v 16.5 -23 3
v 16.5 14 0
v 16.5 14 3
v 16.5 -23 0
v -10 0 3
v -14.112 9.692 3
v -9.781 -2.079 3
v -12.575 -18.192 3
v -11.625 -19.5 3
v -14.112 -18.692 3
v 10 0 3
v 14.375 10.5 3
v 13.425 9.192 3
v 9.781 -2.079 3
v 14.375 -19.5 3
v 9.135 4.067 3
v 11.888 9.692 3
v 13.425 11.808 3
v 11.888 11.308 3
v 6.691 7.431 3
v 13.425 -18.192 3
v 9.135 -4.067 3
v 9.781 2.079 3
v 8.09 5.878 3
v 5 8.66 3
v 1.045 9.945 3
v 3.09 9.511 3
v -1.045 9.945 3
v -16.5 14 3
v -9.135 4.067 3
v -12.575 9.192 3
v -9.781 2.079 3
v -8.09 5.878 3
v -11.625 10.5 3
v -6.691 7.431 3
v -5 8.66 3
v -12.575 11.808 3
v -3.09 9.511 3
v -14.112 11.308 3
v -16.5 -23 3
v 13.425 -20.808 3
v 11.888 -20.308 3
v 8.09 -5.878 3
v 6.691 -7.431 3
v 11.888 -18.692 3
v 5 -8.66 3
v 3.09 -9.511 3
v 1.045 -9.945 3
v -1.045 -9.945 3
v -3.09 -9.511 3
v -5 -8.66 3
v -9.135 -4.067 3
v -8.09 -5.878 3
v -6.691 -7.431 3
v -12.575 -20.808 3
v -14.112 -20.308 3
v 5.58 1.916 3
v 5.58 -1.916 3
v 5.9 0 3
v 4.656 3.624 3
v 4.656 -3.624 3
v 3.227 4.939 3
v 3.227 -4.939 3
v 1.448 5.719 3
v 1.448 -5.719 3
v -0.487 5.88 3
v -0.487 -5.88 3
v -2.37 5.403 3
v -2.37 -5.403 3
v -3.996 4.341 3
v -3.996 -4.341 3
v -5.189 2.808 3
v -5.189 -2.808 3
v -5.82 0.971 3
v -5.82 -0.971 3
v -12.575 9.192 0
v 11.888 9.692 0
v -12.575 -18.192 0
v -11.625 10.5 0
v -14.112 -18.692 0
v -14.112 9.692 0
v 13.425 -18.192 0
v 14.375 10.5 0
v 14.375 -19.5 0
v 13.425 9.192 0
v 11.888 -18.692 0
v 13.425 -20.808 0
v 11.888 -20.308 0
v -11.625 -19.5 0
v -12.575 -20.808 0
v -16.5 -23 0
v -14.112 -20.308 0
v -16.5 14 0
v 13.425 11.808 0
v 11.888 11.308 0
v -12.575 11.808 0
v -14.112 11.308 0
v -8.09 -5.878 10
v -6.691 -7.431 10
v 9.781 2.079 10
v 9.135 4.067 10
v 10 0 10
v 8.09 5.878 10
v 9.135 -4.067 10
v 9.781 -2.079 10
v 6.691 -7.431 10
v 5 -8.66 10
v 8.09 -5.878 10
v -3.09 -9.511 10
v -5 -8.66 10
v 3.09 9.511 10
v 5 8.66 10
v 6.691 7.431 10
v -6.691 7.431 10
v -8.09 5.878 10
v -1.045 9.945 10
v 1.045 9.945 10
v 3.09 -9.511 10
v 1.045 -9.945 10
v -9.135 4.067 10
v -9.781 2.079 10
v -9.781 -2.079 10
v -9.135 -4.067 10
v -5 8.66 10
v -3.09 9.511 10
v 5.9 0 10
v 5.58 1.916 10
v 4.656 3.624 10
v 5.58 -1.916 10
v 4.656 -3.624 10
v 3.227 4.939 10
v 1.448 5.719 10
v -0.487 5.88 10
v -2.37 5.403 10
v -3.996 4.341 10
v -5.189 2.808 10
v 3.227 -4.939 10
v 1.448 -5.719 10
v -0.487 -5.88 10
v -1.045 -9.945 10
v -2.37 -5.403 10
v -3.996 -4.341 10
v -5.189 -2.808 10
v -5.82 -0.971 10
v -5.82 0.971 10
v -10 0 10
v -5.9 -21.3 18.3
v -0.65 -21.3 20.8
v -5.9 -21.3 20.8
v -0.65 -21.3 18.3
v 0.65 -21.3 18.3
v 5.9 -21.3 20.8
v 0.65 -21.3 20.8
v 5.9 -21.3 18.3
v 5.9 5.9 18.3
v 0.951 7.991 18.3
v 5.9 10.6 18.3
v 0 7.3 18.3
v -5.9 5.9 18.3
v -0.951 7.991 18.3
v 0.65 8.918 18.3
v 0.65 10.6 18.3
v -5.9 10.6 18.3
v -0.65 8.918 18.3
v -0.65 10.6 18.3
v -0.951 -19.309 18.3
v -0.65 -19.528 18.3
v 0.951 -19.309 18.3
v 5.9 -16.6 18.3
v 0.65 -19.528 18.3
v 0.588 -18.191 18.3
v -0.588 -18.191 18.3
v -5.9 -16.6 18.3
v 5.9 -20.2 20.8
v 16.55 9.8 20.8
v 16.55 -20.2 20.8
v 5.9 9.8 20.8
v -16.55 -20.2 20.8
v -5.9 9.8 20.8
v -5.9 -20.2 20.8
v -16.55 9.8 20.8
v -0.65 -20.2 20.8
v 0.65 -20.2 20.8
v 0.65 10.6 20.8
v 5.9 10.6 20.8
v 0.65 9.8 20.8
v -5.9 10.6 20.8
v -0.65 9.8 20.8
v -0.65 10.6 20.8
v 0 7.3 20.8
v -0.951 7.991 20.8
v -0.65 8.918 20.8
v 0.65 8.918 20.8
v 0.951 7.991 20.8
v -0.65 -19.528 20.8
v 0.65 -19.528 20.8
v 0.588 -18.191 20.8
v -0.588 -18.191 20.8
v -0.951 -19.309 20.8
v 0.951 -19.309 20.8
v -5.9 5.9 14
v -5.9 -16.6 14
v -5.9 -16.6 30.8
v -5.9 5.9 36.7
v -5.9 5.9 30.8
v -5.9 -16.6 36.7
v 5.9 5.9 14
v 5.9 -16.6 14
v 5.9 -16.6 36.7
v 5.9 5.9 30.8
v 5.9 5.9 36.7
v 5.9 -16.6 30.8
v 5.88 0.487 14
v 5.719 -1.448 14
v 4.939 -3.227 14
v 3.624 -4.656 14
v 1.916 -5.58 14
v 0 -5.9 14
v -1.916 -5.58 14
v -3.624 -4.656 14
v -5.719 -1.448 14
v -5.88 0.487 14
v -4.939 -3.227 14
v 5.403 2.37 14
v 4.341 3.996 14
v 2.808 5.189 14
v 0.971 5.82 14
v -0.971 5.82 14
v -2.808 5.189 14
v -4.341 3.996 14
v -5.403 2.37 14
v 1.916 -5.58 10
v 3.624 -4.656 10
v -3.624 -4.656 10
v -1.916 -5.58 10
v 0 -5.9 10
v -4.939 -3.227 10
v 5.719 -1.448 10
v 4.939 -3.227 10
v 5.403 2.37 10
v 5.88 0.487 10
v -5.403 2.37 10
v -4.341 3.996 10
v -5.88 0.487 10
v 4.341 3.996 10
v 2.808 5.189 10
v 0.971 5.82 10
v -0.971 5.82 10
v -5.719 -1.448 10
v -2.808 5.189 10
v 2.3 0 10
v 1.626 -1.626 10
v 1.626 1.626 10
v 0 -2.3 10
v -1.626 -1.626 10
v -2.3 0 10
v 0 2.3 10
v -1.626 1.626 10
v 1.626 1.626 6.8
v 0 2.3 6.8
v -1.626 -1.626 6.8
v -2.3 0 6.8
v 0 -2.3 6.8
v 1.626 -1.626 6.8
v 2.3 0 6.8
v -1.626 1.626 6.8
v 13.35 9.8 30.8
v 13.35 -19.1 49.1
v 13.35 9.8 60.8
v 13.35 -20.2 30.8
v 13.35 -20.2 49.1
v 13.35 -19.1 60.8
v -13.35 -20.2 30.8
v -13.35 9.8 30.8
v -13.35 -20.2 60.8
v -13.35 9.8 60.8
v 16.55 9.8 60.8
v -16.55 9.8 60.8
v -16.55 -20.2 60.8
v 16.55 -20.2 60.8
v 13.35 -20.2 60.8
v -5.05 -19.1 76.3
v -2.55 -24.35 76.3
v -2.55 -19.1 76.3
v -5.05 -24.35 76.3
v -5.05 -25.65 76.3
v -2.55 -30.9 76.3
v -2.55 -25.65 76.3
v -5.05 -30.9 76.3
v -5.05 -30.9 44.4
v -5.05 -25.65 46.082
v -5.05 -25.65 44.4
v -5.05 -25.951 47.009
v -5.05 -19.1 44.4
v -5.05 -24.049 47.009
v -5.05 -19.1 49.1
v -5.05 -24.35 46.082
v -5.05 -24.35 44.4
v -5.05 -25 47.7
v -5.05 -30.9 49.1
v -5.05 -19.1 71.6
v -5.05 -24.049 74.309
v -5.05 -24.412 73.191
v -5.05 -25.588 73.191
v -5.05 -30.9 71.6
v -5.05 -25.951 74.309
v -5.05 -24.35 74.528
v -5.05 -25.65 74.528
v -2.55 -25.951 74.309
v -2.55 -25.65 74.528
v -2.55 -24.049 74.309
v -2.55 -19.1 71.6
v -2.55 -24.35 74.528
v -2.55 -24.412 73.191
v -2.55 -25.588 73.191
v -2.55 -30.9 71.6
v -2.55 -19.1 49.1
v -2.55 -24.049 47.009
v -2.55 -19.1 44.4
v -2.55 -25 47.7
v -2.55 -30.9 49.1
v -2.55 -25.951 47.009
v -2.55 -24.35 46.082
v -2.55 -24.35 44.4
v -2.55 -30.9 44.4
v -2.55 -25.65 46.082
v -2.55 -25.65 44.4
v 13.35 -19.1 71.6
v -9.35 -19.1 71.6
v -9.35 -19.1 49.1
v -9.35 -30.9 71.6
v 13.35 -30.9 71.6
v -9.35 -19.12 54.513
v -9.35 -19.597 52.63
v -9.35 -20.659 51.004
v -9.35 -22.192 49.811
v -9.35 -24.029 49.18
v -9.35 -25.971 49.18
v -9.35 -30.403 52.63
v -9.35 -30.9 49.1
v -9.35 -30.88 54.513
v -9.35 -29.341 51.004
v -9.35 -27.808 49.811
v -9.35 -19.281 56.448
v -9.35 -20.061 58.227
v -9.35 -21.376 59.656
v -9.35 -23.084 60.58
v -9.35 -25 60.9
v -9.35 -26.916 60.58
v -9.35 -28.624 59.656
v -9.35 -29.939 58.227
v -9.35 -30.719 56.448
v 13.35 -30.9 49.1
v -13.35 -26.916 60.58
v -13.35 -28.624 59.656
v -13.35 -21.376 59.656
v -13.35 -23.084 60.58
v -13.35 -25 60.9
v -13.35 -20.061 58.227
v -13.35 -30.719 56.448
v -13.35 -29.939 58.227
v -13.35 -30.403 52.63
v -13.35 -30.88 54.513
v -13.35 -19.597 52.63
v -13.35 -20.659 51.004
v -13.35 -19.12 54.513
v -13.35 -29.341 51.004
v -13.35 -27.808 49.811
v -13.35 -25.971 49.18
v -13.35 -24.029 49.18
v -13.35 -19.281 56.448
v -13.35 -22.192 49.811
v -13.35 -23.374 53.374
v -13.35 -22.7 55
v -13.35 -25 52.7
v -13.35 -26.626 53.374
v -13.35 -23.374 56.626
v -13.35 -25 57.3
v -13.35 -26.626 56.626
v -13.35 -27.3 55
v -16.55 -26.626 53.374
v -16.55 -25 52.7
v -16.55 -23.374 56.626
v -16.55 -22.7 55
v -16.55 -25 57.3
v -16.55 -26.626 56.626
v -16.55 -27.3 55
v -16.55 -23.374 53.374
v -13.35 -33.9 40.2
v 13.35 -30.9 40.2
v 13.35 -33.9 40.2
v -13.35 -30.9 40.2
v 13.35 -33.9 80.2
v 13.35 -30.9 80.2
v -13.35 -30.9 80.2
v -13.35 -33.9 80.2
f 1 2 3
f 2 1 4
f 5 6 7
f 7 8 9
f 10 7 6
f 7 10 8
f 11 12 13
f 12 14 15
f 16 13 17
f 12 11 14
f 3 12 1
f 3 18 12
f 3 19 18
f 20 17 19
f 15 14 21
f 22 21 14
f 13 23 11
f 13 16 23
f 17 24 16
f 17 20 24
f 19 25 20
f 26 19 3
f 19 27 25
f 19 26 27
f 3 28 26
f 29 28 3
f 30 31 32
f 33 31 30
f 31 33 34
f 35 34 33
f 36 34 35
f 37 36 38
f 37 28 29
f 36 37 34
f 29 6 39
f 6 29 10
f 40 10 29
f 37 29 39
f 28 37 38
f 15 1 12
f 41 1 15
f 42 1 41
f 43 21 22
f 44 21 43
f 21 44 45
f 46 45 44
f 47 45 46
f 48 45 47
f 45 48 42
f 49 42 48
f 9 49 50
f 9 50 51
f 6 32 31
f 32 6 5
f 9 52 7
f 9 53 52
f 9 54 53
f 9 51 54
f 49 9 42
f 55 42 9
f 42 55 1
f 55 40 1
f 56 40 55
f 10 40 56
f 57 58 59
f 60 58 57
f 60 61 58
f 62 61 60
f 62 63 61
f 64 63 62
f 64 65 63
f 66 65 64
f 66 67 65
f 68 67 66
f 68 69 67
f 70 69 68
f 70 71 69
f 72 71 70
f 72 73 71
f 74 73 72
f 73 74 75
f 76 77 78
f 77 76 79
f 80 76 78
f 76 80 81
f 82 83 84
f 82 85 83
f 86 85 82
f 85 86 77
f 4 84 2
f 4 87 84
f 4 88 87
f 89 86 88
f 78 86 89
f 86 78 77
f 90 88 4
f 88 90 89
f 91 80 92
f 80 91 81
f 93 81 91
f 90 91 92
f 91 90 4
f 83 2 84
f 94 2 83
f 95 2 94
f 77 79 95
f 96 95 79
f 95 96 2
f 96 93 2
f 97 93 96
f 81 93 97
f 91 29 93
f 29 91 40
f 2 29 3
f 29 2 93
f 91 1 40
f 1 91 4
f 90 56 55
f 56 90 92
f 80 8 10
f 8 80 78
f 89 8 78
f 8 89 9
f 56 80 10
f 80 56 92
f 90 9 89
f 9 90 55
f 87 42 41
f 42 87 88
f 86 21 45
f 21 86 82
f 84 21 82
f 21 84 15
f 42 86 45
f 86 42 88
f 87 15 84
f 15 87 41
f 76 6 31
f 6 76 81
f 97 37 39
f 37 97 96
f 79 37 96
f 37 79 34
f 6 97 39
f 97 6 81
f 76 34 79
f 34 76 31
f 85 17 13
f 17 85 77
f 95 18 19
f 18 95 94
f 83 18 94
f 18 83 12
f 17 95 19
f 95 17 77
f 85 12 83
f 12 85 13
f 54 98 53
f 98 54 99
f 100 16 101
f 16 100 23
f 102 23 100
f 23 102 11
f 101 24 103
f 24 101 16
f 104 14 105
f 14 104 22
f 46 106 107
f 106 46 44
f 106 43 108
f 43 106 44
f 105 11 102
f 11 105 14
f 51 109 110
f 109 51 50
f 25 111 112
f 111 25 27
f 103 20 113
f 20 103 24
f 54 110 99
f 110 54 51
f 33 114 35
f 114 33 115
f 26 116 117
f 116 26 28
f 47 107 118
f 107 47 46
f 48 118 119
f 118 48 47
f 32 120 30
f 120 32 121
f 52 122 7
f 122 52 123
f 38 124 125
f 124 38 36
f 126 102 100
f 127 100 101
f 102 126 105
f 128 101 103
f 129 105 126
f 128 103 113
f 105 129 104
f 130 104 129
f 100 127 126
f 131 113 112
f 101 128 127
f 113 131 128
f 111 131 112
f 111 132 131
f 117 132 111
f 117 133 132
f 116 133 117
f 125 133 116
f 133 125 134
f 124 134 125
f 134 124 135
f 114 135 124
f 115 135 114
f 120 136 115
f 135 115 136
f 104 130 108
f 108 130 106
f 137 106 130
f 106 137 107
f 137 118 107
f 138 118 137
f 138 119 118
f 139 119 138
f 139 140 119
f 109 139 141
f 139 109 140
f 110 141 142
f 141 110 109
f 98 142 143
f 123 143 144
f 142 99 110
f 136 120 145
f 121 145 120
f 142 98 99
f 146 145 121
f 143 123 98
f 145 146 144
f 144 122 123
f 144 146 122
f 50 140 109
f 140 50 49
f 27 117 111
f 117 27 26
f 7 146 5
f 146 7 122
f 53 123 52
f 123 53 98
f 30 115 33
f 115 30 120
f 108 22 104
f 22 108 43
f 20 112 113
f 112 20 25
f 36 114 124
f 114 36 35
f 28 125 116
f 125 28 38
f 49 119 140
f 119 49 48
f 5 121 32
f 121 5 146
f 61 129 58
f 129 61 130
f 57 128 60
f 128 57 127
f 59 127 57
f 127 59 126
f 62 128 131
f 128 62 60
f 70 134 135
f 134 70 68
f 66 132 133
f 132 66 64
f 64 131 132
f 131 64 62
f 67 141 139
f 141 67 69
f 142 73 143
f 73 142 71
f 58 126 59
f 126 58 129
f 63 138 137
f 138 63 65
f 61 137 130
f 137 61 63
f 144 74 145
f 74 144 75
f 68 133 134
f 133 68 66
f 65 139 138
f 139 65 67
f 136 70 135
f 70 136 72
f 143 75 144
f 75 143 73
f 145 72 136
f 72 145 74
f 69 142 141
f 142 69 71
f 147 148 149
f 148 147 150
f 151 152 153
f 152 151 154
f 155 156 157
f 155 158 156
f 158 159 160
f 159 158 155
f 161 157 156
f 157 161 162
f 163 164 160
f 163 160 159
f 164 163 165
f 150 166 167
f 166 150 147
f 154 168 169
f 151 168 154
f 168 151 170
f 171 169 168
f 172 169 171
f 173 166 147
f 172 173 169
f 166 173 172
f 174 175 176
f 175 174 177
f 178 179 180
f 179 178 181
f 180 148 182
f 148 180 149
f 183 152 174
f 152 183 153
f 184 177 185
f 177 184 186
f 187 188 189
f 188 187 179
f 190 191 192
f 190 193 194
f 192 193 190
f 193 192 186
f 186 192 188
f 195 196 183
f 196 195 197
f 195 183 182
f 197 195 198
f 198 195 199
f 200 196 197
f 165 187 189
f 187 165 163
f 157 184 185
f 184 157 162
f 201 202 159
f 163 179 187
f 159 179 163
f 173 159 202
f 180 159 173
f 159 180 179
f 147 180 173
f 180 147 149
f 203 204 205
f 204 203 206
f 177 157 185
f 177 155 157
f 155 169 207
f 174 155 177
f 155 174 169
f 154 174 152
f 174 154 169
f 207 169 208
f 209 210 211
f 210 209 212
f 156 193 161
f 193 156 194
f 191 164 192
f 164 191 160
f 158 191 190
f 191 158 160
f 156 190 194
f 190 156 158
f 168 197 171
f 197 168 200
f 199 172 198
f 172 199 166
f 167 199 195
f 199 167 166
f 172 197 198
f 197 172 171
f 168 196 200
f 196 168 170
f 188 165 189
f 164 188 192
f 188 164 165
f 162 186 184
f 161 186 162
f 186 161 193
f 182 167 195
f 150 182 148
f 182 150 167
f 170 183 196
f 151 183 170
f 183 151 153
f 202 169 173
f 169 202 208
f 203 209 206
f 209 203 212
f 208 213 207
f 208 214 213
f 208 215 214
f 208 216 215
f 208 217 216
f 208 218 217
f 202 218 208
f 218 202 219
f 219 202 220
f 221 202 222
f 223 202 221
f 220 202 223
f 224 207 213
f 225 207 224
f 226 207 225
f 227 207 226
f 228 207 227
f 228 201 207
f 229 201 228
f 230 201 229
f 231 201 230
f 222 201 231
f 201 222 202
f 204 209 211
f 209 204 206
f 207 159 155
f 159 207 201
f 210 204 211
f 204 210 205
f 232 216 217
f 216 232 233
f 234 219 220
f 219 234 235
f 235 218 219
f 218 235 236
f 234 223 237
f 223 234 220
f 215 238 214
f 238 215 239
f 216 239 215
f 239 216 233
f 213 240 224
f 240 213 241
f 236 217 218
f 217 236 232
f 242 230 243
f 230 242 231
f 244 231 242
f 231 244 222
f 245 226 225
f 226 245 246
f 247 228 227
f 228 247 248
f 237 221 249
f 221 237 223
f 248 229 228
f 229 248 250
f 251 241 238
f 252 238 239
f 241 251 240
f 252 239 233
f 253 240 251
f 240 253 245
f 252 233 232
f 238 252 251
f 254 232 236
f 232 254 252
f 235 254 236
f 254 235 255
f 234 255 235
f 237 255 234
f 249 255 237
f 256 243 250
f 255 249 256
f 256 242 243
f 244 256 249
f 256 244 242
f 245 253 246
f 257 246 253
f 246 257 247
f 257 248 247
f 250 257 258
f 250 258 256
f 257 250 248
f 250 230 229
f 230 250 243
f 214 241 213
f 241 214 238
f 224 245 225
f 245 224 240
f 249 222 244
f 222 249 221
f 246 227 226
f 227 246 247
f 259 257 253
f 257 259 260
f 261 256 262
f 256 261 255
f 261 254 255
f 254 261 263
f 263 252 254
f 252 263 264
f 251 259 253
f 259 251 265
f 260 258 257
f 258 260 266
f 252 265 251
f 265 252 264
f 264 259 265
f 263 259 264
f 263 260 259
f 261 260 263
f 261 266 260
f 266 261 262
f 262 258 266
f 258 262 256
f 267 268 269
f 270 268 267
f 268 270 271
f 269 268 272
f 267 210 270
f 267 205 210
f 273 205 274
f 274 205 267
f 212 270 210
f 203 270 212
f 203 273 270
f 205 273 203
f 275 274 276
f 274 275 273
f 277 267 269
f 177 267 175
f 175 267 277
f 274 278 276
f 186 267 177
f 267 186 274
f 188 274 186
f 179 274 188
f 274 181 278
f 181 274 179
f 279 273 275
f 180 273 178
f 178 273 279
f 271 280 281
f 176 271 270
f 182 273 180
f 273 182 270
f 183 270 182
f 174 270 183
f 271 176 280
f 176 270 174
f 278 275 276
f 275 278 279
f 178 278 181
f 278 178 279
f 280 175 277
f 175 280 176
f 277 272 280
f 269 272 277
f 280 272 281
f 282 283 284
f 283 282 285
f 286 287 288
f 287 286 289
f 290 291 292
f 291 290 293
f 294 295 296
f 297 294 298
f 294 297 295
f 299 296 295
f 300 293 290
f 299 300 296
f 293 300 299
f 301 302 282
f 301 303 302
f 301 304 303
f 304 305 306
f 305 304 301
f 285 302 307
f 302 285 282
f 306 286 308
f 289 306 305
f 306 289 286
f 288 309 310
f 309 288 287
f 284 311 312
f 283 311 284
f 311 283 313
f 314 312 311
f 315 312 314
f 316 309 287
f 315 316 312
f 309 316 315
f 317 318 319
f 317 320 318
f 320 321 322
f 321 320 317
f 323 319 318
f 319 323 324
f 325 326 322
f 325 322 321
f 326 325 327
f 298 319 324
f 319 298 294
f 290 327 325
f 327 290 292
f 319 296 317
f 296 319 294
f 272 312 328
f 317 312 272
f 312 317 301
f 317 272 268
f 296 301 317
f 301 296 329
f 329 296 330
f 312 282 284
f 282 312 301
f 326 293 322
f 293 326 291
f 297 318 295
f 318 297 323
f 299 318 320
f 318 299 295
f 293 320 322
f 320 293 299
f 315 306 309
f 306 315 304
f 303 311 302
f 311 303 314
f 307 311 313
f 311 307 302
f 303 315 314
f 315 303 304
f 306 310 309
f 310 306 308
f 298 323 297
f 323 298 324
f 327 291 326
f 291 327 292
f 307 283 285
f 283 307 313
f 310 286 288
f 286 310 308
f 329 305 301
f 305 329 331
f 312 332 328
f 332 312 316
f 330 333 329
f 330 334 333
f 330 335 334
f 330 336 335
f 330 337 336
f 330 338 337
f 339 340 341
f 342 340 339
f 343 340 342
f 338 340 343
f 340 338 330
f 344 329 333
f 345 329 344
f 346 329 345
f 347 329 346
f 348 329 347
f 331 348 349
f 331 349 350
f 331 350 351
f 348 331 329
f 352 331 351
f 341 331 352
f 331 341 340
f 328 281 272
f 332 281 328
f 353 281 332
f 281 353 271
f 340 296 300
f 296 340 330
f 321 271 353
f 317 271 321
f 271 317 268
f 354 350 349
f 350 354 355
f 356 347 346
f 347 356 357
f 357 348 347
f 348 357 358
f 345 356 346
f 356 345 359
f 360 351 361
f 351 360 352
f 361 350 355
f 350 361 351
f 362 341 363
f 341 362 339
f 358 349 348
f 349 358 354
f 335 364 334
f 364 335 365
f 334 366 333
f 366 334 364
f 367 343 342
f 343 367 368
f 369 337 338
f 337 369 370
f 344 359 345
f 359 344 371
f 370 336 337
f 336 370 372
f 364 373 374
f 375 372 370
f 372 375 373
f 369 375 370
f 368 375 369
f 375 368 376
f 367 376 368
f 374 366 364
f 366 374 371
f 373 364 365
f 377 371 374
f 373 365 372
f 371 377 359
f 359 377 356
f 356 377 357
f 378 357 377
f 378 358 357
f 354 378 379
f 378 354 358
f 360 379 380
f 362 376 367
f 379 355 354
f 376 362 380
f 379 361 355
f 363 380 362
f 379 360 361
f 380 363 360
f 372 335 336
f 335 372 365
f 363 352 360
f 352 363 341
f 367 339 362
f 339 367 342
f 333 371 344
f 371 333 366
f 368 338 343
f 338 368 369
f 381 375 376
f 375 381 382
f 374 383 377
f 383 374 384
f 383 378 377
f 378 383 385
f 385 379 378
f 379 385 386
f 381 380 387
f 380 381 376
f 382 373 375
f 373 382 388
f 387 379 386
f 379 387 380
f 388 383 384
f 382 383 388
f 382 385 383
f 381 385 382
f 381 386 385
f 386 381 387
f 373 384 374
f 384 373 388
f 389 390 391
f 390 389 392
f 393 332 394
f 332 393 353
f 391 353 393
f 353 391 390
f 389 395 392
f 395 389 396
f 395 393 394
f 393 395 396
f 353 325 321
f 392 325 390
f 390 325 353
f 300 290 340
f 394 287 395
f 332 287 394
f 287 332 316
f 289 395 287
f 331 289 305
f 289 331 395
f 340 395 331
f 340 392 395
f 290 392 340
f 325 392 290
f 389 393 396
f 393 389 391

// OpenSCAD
// file: servo_sg90.scad
servo_sg90();

module servo_sg90()
{
    width = 22.5;
    length = 11.8;
    height = 22.7;
    
    mounting_width = width + (2 * 4.7);
    mounting_length = length;
    mounting_height = 2.5;
    mounting_width_offset = -4.7;
    mounting_height_offset = 18.4 - mounting_height;
    
    mounting_hole_diameter = 2;
    mounting_hole_width_offset = 2.3;
    mounting_hole_length_offset = 5.9;
    
    mounting_notch_width = mounting_hole_width_offset;
    mounting_notch_length = 1.3;
    mounting_notch_width_offset = mounting_notch_width / 2;
    
    mount_point_height = 4;
    mount_point_diameter = 11.8;
    mount_point_width_offset = 5.9;
    mount_point_length_offset = length / 2;
    mount_point_height_offset = height;
    
    gear_height = 3.2;
    gear_diameter = 4.6;
    gear_width_offset = mount_point_width_offset;
    gear_length_offset = mount_point_length_offset;
    gear_height_offset = mount_point_height_offset + mount_point_height;
    
    rotate([0, 180, 0])
    translate([-(gear_width_offset), -(gear_length_offset), -(height + mount_point_height)])
    union()
    {
        color("blue", 1.0)
        cube([width, length, height], false);
        
        color("blue", 1.0)
        translate([mounting_width_offset, 0, mounting_height_offset])
        difference()
        {
            cube([mounting_width, mounting_length, mounting_height], false);
            
            translate([mounting_hole_width_offset, mounting_hole_length_offset, 0])
            cylinder(height, d = mounting_hole_diameter);
            
            translate([mounting_width - mounting_hole_width_offset, mounting_hole_length_offset, 0])
            cylinder(height, d = mounting_hole_diameter);
            
            translate([mounting_notch_width_offset, mounting_hole_length_offset, 0])
            cube([mounting_notch_width, mounting_notch_length, height], true);

            translate([mounting_width - mounting_notch_width_offset, mounting_hole_length_offset, 0])
            cube([mounting_notch_width, mounting_notch_length, height], true);
        }
        
        color("blue", 1.0)
        translate([mount_point_width_offset, mount_point_length_offset, mount_point_height_offset])
        cylinder(mount_point_height, d = mount_point_diameter);
        
        color("white", 1.0)
        translate([gear_width_offset, gear_length_offset, gear_height_offset])
        cylinder(gear_height, d = gear_diameter);
    }
}
// main file
use <servo_sg90.scad>

raspberry_pi_pan_tilt_base__base_height = 3;
raspberry_pi_pan_tilt_base__bottom_servo_mount_height = 7;

raspberry_pi_pan_tilt(6.5, 0, 0);

module raspberry_pi_pan_tilt(bottom_mount_offset, pan_angle, tilt_angle)
{
    bottom_servo_height_offset = 10;
    
    bottom_servo_housing_width = 26.7;
    bottom_servo_housing_length = 30;
    bottom_servo_housing_height = 10;
    bottom_servo_housing_mount_height = 40;
    bottom_servo_housing_length_offset = -5.2;
    bottom_servo_housing_height_offset = bottom_servo_height_offset + 10.8;
    
    top_servo_width_offset = -(26.7 / 2);//-15;
    top_servo_length_offset = -25;
    top_servo_height_offset = 55;

    top_servo_housing_width = 40;
    top_servo_housing_length = 3;
    top_servo_housing_height = 26.7;
    top_servo_housing_width_offset = -5.2;
    top_servo_housing_length_offset = -5.9 - (top_servo_housing_length / 2);
    top_servo_housing_height_offset = 0;
    
    raspberry_pi_pan_tilt_base(bottom_mount_offset);

    rotate([0, 0, pan_angle])
    union()
    {
        rotate([0, 0, 90])
        translate([0, 0, bottom_servo_height_offset])
        servo_sg90();
        
        translate([0, bottom_servo_housing_length_offset, bottom_servo_housing_height_offset])
        raspberry_pi_pan_tilt_bottom_servo_housing(bottom_servo_housing_width, bottom_servo_housing_length, bottom_servo_housing_height, bottom_servo_housing_mount_height);

        rotate([90, 90, 90])
        translate([-top_servo_height_offset, top_servo_length_offset, top_servo_width_offset])
        rotate([0, 0, tilt_angle])
        union()
        {
            servo_sg90();
            
            translate([top_servo_housing_width_offset, top_servo_housing_length_offset, top_servo_housing_height_offset])
            raspberry_pi_pan_tilt_top_servo_housing(top_servo_housing_width, top_servo_housing_length, top_servo_housing_height);
        }
    }
}

module raspberry_pi_pan_tilt_base(bottom_mount_offset)
{
    base_width = 33;
    base_length = 37;
    base_height = 3;
    
    mounting_hole_width = 26;
    mounting_hole_length = 30;
    
    mounting_hole_diameter = 2.75;
    mounting_hole_width_offset = (base_width - mounting_hole_width) / 2;
    mounting_hole_length_offset = (base_length - mounting_hole_length) / 2;
    
    bottom_servo_mount_height = 7;
    bottom_servo_mount_outer_diameter = 20;
    bottom_servo_mount_inner_diameter = 11.8;
    
    bottom_servo_mount_width_offset = base_width / 2;
    bottom_servo_mount_length_offset = bottom_mount_offset + (base_width / 2);
    bottom_servo_mount_height_offset = base_height;

    translate([-(bottom_servo_mount_width_offset), -(bottom_servo_mount_length_offset), 0])
    color("black", 1.0)
    union()
    {
        difference()
        {
            cube([base_width, base_length, base_height], false);
            
            translate([mounting_hole_width_offset, mounting_hole_length_offset, 0])
            cylinder(base_height * 2, d = mounting_hole_diameter, true);

            translate([base_width - mounting_hole_width_offset, mounting_hole_length_offset, 0])
            cylinder(base_height * 2, d = mounting_hole_diameter, true);

            translate([mounting_hole_width_offset, base_length - mounting_hole_length_offset, 0])
            cylinder(base_height * 2, d = mounting_hole_diameter, true);

            translate([base_width - mounting_hole_width_offset, base_length - mounting_hole_length_offset, 0])
            cylinder(base_height * 2, d = mounting_hole_diameter, true);
        }
        
        translate([bottom_servo_mount_width_offset, bottom_servo_mount_length_offset, bottom_servo_mount_height_offset])
        difference()
        {
            cylinder(bottom_servo_mount_height, d = bottom_servo_mount_outer_diameter);
            cylinder(bottom_servo_mount_height, d = bottom_servo_mount_inner_diameter);
        }
    }
}

module raspberry_pi_pan_tilt_bottom_servo_housing(housing_width, housing_length, housing_height, mount_height)
{
    thickness = 3.2;
    
    color("black", 1.0)
    translate([-(housing_width / 2), -(housing_length / 2), 0])
    union()
    {
        cube([housing_width, housing_length, housing_height], false);
        
        translate([-thickness, 0, 0])
        cube([thickness, housing_length, mount_height]);

        translate([housing_width, 0, 0])
        cube([thickness, housing_length, mount_height]);
    }
}

module raspberry_pi_pan_tilt_top_servo_housing(housing_width, housing_length, housing_height)
{
    color("black", 1.0)
    translate([-(housing_width / 2), -(housing_length / 2), 0])
    cube([housing_width, housing_length, housing_height], false);
}
